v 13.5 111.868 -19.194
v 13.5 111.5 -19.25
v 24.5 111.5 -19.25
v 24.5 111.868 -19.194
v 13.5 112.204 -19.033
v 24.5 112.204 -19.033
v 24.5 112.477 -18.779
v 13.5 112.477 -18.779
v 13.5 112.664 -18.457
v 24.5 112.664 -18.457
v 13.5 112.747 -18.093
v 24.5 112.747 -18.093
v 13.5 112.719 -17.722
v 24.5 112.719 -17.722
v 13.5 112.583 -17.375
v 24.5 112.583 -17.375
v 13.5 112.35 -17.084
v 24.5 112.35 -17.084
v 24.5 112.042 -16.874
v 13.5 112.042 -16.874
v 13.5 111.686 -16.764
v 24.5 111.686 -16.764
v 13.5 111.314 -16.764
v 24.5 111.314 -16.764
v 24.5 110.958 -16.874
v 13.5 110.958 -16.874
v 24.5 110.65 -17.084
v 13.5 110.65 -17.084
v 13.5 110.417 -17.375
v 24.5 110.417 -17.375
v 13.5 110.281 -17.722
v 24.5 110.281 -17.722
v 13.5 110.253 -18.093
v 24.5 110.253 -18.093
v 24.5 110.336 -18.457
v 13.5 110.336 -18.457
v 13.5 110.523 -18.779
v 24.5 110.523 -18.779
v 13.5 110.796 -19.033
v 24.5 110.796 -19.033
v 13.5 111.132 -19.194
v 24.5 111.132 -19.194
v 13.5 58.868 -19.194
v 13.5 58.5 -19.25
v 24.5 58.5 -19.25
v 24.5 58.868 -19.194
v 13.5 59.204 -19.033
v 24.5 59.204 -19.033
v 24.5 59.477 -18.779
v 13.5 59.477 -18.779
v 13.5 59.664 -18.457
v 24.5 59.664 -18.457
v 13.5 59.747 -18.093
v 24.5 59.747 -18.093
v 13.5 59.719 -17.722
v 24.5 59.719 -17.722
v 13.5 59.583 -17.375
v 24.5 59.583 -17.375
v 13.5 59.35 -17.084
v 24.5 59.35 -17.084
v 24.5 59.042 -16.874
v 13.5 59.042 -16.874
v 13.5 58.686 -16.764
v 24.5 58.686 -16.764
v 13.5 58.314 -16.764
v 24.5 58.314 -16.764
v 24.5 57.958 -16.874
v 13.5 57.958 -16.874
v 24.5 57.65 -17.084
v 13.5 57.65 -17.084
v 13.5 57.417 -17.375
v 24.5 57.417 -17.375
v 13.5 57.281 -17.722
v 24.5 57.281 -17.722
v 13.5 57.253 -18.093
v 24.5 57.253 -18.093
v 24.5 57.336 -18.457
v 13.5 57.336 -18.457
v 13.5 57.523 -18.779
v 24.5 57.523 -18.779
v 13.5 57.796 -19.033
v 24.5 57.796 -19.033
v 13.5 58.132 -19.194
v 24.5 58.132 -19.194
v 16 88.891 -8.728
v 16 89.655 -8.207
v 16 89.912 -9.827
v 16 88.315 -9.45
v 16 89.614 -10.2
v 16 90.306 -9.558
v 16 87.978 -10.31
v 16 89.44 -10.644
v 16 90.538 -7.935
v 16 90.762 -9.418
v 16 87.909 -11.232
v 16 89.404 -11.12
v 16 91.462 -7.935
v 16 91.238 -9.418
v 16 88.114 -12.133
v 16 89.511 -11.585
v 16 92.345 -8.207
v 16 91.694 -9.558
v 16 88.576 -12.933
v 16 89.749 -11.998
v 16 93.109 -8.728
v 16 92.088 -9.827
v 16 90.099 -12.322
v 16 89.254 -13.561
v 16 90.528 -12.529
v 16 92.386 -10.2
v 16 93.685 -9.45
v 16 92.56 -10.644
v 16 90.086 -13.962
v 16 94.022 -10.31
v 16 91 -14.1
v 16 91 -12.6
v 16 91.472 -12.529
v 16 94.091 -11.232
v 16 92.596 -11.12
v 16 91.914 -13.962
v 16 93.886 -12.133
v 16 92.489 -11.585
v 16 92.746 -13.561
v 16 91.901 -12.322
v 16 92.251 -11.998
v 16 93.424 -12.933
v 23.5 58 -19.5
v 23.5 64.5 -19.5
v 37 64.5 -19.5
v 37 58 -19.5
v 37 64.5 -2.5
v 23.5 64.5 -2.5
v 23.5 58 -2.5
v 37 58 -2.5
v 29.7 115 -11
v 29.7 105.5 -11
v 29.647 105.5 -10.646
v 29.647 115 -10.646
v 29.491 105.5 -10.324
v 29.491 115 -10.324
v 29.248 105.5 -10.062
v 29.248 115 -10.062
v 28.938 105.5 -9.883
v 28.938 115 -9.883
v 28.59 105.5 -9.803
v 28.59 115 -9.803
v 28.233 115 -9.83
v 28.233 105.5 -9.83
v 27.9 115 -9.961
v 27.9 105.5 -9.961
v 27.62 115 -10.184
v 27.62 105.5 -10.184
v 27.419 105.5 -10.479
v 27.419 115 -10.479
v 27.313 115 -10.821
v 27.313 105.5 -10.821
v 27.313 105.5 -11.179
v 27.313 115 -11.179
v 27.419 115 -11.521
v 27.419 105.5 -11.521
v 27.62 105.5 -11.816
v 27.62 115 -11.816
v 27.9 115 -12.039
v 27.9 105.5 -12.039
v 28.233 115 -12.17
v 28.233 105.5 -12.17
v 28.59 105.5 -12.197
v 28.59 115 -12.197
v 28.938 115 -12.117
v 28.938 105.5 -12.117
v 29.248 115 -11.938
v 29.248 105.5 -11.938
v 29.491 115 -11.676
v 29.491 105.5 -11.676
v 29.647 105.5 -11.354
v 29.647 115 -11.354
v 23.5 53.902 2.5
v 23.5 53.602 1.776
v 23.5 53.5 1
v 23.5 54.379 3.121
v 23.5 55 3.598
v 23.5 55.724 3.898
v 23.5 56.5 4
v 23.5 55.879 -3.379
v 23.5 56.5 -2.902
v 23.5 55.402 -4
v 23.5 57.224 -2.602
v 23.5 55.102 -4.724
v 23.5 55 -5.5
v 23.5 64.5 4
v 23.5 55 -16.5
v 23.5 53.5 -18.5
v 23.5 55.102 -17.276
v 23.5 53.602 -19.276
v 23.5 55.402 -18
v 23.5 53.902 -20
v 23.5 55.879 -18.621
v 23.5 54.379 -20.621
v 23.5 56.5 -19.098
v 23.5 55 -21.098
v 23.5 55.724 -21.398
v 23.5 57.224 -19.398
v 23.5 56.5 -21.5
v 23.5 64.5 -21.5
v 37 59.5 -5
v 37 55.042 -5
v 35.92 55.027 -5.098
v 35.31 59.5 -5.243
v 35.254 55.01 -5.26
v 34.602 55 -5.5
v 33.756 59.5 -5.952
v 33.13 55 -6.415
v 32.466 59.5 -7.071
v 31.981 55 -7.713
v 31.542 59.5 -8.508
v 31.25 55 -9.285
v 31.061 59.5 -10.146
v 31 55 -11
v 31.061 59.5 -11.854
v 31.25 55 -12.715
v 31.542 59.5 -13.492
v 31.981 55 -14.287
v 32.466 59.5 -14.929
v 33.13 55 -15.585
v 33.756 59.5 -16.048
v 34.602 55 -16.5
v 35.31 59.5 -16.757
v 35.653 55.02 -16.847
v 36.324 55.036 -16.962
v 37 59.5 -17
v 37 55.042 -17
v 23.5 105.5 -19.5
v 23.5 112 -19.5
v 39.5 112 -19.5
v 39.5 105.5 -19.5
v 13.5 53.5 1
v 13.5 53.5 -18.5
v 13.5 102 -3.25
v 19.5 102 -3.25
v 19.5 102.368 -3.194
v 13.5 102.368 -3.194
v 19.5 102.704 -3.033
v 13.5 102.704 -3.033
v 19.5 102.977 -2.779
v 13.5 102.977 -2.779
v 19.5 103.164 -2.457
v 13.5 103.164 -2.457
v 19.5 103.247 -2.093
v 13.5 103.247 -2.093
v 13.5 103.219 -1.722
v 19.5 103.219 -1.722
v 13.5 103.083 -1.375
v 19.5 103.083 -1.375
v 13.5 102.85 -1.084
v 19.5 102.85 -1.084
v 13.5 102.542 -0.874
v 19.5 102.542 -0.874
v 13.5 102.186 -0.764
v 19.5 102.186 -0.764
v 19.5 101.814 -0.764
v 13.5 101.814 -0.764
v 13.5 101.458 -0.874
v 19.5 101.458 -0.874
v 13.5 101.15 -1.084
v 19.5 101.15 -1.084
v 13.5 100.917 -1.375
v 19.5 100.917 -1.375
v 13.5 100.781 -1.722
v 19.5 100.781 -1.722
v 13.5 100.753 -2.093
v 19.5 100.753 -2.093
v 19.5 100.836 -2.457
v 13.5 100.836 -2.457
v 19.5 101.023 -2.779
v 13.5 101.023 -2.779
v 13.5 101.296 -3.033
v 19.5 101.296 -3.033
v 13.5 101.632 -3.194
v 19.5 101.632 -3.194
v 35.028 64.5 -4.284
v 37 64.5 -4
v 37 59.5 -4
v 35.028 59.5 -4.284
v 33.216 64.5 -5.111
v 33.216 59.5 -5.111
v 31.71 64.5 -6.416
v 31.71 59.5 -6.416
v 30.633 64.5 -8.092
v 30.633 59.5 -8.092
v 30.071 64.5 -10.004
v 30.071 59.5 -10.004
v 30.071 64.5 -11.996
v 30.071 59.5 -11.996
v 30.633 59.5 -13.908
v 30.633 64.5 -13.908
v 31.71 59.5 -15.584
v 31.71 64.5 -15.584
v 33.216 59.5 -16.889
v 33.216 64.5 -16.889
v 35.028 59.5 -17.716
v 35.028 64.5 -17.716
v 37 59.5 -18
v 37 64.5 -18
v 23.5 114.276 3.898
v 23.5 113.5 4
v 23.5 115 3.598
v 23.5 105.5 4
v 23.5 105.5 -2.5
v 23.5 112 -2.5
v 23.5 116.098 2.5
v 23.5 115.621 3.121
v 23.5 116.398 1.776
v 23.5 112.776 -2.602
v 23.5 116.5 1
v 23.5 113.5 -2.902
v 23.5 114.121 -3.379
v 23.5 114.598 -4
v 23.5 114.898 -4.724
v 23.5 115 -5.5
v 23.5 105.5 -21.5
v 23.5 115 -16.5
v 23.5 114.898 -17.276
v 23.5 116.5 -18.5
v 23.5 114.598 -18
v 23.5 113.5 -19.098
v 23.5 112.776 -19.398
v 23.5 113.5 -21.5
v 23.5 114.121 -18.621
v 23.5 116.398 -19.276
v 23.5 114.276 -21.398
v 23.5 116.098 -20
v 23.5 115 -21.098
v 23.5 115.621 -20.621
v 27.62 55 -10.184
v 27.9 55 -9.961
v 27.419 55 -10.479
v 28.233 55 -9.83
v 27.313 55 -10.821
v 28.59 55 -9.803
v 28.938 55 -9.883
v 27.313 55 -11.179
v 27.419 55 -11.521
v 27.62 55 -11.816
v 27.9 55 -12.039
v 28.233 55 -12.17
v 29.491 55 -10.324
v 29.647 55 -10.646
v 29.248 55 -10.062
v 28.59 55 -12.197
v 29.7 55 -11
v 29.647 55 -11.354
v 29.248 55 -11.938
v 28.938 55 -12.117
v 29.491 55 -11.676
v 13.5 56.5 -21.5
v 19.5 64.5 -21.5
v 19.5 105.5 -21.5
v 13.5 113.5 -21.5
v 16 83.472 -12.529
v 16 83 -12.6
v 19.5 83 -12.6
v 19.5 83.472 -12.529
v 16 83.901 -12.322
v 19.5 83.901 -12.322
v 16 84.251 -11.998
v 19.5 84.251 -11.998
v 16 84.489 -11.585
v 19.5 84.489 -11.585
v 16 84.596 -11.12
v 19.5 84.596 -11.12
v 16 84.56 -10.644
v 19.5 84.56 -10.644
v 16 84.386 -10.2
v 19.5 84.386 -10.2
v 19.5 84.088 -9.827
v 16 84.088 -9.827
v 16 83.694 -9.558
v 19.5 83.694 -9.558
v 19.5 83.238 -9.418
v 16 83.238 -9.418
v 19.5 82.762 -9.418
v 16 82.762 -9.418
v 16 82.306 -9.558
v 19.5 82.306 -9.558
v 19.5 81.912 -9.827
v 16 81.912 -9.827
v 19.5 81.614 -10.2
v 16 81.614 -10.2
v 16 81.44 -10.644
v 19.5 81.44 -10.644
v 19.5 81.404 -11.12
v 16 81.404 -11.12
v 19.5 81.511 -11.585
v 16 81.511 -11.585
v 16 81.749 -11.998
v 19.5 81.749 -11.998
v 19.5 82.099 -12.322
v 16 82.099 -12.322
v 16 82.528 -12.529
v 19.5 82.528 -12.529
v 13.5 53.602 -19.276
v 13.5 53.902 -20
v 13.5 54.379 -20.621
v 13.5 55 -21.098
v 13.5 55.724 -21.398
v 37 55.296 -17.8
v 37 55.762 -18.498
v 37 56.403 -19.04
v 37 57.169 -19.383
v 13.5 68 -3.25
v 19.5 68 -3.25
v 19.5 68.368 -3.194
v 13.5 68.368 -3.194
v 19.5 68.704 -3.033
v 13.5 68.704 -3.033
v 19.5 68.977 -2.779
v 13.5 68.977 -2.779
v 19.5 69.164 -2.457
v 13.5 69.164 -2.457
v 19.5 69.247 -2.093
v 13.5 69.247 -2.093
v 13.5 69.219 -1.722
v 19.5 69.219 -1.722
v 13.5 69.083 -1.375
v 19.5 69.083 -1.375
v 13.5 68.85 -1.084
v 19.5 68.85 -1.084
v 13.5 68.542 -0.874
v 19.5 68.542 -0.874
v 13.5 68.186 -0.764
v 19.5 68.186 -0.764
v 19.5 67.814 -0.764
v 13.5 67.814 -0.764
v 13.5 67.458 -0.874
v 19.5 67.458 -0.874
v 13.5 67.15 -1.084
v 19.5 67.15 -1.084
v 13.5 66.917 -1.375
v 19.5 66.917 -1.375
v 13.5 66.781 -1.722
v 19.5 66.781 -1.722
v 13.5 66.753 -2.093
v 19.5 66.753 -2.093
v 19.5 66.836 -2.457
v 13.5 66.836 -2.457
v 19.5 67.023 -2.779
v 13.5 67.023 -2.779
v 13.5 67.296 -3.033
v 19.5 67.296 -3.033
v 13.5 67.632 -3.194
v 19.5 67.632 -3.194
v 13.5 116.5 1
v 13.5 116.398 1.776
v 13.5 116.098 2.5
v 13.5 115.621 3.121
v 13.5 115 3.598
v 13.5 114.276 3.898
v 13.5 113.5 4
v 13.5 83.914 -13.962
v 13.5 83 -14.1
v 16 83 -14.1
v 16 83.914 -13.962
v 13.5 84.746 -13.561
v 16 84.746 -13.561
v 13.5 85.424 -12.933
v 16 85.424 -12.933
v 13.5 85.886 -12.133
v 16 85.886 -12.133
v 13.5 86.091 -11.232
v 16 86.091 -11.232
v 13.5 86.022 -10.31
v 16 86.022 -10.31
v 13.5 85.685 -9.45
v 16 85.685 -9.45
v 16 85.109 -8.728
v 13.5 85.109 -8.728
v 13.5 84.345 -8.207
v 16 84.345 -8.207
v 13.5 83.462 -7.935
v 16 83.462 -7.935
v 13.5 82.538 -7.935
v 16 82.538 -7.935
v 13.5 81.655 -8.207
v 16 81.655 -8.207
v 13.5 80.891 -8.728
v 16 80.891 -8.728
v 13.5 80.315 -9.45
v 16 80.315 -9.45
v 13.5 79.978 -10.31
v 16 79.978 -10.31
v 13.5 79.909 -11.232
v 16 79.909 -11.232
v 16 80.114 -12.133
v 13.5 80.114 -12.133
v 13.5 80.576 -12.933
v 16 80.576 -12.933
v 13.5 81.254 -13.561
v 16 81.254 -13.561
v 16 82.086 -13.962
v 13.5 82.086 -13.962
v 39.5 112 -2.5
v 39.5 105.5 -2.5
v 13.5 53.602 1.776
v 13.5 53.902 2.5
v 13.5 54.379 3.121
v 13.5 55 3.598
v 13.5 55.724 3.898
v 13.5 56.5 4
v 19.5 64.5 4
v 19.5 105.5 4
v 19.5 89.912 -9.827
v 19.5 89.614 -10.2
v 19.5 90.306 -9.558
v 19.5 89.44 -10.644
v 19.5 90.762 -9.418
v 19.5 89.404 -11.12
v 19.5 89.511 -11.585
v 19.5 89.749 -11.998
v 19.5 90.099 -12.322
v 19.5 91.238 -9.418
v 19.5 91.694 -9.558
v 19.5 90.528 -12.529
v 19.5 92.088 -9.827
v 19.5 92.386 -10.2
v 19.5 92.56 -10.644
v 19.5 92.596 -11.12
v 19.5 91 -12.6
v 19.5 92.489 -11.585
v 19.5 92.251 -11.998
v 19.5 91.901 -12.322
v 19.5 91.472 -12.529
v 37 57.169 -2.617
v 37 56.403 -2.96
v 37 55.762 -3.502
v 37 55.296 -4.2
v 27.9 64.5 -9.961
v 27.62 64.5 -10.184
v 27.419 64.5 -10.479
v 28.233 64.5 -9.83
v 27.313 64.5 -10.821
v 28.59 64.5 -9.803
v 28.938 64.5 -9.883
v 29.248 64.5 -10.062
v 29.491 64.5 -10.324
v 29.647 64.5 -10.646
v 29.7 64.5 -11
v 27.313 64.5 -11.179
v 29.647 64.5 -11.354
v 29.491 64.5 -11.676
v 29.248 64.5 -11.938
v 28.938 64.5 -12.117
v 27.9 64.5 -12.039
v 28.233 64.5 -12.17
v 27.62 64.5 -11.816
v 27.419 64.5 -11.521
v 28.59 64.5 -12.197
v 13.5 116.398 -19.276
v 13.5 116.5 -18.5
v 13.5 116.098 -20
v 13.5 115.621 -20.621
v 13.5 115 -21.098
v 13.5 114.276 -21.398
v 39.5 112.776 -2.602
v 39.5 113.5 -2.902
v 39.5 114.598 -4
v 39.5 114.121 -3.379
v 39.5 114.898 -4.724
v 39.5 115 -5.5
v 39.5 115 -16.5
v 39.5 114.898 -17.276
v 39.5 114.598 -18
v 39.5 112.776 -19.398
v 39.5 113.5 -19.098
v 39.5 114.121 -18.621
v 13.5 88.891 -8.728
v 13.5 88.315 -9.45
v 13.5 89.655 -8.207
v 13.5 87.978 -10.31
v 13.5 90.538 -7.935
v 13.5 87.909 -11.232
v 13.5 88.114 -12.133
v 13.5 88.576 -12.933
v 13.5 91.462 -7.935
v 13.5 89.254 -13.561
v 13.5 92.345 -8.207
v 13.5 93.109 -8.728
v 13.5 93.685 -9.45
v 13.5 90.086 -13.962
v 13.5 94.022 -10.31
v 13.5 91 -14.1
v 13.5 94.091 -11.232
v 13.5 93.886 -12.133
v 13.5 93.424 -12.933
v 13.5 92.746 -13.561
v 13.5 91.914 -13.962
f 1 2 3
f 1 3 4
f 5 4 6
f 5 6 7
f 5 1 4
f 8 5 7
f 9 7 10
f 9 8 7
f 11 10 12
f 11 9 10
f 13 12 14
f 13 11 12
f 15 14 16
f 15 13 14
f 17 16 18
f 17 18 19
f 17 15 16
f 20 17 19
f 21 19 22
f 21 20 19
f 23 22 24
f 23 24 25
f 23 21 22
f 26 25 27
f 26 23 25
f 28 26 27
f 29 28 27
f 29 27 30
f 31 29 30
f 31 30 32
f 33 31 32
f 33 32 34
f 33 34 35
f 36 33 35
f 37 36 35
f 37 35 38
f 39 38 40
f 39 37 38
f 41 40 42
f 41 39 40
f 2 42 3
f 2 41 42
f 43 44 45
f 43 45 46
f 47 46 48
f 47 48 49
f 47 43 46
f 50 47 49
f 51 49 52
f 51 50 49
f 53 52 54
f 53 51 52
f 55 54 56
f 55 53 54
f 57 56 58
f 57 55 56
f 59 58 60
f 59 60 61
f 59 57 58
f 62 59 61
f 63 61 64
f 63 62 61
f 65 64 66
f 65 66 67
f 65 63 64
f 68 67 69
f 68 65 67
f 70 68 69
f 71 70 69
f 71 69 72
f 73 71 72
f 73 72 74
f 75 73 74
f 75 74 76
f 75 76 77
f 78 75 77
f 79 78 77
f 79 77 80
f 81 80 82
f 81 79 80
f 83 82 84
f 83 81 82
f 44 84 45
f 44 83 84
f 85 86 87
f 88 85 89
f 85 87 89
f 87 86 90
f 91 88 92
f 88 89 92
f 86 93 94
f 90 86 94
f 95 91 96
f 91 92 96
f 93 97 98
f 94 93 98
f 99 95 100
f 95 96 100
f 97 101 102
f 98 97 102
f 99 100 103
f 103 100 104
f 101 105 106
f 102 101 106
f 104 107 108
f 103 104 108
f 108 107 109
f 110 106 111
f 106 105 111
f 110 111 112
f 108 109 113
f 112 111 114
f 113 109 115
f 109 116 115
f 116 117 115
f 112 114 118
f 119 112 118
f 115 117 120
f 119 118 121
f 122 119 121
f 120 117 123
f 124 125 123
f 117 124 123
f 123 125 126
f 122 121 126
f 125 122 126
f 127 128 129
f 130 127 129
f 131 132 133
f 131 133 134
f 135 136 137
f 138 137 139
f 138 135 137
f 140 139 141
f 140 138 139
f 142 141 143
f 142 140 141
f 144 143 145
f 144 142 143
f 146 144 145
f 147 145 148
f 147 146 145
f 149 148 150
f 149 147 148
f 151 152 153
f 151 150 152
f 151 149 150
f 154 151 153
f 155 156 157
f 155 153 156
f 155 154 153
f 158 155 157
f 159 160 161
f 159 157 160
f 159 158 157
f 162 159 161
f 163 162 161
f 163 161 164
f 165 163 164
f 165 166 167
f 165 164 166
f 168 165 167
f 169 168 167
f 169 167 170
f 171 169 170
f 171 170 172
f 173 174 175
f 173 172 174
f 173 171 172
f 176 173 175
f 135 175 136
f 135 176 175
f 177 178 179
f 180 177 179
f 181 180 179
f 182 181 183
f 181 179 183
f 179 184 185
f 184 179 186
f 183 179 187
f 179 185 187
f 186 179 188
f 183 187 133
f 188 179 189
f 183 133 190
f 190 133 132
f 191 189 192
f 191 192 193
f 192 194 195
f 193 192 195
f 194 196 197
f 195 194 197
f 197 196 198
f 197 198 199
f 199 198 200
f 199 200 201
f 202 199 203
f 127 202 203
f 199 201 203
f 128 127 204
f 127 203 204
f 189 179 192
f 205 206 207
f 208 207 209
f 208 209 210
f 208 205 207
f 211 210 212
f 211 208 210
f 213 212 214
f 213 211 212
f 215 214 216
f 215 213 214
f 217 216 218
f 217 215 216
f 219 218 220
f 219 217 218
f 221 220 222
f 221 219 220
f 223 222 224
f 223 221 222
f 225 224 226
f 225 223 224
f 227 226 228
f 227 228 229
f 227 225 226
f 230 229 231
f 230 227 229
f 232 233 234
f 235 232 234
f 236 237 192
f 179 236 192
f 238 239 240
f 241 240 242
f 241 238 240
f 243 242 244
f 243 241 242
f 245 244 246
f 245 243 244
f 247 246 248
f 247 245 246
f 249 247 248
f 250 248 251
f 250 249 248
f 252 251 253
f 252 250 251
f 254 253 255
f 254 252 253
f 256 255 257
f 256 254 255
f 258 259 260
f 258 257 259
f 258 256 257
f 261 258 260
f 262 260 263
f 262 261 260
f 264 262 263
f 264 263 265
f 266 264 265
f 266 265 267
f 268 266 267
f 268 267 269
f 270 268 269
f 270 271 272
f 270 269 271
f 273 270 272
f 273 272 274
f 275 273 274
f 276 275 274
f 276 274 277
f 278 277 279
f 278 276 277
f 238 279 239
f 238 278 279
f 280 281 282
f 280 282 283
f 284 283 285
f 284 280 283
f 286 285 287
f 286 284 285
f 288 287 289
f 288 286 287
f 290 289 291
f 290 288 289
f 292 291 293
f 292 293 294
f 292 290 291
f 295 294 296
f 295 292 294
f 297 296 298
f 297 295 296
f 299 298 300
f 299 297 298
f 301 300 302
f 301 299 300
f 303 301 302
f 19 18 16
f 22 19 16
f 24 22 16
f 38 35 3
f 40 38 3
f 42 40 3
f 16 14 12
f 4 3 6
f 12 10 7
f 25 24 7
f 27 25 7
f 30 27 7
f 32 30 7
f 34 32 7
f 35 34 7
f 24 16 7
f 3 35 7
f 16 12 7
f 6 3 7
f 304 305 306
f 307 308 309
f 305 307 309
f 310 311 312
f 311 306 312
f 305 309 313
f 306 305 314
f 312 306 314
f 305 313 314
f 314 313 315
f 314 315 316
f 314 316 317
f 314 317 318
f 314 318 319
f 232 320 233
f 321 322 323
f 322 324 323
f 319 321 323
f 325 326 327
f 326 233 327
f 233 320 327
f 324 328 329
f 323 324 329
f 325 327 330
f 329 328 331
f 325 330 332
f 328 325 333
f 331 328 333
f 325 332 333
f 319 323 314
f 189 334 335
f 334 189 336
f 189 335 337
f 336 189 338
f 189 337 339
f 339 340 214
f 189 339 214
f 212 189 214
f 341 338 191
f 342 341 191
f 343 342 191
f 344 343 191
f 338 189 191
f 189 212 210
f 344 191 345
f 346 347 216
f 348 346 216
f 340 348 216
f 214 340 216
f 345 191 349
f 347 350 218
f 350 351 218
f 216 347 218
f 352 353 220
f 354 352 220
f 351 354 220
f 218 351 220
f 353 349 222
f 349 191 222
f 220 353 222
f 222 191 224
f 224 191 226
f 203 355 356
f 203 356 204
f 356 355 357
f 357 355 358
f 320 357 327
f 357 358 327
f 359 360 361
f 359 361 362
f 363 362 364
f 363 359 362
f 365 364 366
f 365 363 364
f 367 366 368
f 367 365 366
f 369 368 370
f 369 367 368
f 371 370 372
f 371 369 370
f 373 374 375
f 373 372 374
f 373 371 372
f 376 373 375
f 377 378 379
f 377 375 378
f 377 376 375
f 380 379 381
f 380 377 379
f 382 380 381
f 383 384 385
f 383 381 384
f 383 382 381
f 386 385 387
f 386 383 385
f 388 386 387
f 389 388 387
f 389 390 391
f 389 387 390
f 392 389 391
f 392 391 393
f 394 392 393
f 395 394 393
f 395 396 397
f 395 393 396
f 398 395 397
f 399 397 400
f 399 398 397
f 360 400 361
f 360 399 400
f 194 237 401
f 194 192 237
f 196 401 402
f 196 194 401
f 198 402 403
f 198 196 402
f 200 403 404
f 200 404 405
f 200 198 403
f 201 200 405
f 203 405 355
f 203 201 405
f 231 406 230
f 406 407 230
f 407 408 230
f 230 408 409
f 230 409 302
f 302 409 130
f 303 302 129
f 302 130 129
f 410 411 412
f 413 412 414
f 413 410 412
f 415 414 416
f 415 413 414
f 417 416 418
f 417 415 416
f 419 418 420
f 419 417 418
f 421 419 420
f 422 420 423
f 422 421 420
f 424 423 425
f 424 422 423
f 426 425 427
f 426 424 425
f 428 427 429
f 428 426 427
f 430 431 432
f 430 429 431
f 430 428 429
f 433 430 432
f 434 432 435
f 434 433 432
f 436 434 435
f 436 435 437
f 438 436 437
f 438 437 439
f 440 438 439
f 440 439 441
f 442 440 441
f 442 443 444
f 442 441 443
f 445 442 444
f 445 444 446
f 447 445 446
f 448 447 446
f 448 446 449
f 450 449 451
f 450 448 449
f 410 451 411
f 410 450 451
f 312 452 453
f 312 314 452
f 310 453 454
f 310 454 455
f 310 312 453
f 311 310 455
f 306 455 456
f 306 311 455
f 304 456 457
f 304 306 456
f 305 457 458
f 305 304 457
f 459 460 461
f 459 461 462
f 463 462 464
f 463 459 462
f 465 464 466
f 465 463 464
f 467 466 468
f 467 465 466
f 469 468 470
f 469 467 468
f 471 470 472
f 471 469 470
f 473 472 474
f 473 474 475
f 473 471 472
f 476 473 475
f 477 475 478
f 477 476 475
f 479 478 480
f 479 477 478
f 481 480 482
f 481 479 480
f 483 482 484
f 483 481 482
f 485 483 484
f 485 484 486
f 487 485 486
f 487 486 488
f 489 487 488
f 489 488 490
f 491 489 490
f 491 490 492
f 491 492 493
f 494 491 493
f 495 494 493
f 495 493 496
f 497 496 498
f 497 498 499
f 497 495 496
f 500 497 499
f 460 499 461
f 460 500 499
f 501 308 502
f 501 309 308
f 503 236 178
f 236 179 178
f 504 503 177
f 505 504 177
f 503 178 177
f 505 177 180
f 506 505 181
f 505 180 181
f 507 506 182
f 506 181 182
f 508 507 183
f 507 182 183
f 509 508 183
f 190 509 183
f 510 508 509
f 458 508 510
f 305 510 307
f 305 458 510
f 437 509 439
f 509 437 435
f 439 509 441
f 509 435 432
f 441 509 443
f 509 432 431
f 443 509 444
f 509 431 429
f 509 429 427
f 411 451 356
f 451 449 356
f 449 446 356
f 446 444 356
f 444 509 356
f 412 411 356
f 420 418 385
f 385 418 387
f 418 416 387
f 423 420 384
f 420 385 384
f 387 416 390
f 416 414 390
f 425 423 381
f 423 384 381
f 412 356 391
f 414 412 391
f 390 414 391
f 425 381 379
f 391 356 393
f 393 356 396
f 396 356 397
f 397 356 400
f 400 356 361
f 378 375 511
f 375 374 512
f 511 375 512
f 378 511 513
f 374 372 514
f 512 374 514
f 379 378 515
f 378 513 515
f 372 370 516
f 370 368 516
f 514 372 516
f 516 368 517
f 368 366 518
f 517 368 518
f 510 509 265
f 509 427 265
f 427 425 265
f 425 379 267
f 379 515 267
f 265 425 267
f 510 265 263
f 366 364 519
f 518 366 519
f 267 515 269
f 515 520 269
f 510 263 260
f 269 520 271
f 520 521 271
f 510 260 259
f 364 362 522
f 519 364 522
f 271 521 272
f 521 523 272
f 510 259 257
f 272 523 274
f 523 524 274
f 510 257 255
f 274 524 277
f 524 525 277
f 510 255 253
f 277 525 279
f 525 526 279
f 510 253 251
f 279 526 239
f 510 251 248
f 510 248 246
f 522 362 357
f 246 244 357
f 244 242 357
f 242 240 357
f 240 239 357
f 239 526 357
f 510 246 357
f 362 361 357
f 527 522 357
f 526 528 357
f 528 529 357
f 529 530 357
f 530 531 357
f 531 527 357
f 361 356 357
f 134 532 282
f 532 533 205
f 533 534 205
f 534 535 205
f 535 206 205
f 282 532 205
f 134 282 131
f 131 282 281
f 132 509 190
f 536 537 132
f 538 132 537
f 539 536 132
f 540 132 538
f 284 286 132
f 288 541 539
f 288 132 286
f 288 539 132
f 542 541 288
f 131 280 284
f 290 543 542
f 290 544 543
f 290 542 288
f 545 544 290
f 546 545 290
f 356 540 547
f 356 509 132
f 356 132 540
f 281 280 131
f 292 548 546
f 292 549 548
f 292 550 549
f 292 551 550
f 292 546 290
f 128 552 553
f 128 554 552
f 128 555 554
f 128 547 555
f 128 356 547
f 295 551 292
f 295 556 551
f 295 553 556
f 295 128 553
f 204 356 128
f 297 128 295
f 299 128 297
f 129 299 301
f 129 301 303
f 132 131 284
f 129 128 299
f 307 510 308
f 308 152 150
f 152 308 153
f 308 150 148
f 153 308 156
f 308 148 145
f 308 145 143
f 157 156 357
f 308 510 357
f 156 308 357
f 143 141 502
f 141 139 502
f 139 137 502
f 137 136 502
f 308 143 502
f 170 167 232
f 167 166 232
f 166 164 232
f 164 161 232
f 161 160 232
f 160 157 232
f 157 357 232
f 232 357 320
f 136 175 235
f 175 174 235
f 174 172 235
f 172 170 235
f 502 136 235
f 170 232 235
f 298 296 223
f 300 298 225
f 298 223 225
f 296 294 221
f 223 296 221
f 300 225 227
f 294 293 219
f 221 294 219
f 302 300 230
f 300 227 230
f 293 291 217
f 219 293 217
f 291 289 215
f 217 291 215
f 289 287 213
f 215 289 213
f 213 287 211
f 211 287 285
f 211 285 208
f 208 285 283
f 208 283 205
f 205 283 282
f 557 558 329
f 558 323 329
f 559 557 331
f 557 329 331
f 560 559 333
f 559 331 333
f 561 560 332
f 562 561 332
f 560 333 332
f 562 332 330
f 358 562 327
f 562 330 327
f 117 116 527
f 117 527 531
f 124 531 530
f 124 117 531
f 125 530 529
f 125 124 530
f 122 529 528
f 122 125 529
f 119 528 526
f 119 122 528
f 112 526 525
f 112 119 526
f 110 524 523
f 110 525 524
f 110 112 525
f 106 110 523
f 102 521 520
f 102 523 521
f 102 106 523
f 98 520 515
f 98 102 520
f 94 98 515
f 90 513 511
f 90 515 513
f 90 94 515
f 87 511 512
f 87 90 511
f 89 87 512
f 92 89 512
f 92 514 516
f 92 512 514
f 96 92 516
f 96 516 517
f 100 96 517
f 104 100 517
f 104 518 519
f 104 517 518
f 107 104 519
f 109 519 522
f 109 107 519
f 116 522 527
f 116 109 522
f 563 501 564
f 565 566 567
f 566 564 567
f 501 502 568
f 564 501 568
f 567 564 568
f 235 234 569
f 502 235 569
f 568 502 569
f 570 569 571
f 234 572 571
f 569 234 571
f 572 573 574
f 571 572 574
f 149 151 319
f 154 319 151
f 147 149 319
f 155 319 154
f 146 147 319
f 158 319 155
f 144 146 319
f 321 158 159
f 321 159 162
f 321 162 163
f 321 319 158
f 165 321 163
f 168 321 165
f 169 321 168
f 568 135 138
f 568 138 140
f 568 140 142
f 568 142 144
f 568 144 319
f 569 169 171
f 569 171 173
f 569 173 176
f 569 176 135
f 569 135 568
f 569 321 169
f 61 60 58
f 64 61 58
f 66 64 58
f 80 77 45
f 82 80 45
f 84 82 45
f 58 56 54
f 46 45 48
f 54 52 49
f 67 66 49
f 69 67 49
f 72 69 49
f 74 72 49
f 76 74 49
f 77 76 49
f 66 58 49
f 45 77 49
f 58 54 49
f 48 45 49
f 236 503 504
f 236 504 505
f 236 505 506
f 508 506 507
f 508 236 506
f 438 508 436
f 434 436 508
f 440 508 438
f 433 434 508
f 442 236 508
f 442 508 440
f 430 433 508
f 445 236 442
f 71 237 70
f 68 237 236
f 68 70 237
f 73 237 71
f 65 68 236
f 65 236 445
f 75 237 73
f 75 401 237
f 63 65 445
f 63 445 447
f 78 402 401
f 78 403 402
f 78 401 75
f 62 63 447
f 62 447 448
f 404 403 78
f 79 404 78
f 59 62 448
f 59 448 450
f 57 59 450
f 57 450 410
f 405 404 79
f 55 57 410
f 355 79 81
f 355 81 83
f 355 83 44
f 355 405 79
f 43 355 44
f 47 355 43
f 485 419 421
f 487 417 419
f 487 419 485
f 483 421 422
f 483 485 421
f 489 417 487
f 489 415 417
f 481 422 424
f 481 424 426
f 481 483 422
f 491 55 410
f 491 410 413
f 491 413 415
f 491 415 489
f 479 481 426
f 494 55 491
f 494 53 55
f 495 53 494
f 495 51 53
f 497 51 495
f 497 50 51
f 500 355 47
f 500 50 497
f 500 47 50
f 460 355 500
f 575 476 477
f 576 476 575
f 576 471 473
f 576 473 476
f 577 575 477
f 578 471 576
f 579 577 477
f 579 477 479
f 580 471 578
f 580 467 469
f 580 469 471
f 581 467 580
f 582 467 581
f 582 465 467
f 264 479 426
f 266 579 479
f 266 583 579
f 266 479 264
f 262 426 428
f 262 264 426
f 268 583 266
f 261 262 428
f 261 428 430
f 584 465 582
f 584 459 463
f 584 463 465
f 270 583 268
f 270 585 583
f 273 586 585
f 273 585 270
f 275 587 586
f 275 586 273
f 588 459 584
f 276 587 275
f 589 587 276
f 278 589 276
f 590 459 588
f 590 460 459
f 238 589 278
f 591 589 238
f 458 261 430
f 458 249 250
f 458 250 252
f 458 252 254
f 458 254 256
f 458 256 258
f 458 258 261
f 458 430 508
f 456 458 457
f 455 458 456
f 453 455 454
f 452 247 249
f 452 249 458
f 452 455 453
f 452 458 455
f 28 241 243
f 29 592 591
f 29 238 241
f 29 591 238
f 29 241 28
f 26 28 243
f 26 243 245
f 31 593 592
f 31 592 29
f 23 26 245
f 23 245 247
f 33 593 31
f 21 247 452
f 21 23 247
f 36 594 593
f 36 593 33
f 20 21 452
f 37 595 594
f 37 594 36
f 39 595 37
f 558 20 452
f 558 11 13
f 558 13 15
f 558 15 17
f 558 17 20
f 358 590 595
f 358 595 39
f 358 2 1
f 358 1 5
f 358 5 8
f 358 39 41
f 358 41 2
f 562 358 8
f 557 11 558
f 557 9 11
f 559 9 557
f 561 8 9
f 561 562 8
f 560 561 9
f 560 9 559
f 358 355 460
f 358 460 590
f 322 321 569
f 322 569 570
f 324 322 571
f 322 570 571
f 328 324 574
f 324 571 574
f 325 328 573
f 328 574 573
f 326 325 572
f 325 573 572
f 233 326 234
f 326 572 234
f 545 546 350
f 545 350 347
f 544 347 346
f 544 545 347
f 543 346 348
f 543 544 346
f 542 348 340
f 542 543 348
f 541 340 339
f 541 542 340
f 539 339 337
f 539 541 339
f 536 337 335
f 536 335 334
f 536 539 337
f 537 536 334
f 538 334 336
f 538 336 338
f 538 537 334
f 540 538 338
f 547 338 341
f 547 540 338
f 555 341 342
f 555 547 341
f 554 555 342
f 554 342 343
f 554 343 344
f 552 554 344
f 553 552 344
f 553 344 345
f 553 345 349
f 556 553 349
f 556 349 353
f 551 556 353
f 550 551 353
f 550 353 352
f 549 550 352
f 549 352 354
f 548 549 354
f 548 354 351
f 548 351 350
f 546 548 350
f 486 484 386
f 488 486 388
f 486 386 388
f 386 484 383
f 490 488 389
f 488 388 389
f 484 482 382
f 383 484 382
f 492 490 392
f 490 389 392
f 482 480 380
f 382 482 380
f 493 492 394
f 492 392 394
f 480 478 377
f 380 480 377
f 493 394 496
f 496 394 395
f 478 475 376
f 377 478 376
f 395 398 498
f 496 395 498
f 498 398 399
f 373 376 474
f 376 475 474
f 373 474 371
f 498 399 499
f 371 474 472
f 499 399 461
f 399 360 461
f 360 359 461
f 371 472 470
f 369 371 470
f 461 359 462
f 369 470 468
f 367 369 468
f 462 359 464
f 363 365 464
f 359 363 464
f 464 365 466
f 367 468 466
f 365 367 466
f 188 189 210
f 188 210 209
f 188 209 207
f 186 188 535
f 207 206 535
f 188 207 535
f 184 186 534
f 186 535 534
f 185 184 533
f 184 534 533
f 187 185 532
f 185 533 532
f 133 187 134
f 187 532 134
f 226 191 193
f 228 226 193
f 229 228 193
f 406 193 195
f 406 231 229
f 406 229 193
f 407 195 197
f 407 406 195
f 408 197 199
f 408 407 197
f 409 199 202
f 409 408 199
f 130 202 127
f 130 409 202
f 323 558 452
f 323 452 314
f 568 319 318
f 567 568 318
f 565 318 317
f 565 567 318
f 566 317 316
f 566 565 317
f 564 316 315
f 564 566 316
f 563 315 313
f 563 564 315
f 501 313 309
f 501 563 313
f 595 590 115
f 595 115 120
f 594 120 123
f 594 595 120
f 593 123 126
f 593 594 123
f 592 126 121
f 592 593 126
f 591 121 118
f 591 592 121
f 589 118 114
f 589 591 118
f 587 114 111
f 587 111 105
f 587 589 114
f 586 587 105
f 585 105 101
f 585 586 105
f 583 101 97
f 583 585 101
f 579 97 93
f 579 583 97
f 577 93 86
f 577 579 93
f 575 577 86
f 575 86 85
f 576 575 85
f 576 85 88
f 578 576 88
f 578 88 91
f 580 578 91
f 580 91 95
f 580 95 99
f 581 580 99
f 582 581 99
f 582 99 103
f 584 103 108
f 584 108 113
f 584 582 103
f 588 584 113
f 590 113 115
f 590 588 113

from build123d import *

# Parameters (mm, degrees)
CYLINDER959_R           = 1.6
CYLINDER959_DEPTH       = 10
CYLINDER959_PITCH_ANGLE = 90
CYLINDER960_R           = 1.6
CYLINDER960_DEPTH       = 10
CYLINDER960_PITCH_ANGLE = 90
CYLINDER962_R           = 3.1
CYLINDER962_DEPTH       = 2.5
CYLINDER962_PITCH_ANGLE = 90
CYLINDER961_R           = 3.1
CYLINDER961_DEPTH       = 2.5
CYLINDER961_PITCH_ANGLE = 90
BOX562_W                = 41
BOX562_H                = 41
BOX562_DEPTH            = 26
CYLINDER958_R           = 6
CYLINDER958_DEPTH       = 11
CYLINDER958_ROLL_ANGLE  = 90
CYLINDER963_R           = 7
CYLINDER963_DEPTH       = 5
CYLINDER963_ROLL_ANGLE  = 90
BOX563_W                = 10
BOX563_H                = 10
BOX563_DEPTH            = 17
CYLINDER953_R           = 1.2
CYLINDER953_DEPTH       = 10
CYLINDER953_ROLL_ANGLE  = 90
CYLINDER952_R           = 1.2
CYLINDER952_DEPTH       = 10
CYLINDER952_ROLL_ANGLE  = 90
CYLINDER957_R           = 1.25
CYLINDER957_DEPTH       = 15
CYLINDER957_PITCH_ANGLE = 90
CYLINDER955_R           = 1.25
CYLINDER955_DEPTH       = 11
CYLINDER955_PITCH_ANGLE = 90
CYLINDER956_R           = 1.25
CYLINDER956_DEPTH       = 15
CYLINDER956_PITCH_ANGLE = 90
CYLINDER954_R           = 1.25
CYLINDER954_DEPTH       = 11
CYLINDER954_PITCH_ANGLE = 90
BOX561_W                = 10
BOX561_H                = 63
BOX561_DEPTH            = 25.5
FILLET358_R             = 3
BOX560_W                = 16
BOX560_H                = 60
BOX560_DEPTH            = 17
FILLET359_R             = 3


with BuildPart() as cylinder1122:
    # Cylinder959 → Cylinder959 (new body)
    with BuildSketch(Plane.XY):
        Circle(CYLINDER959_R)
    extrude(amount=CYLINDER959_DEPTH)


with BuildPart() as cylinder1122_1:
    # Cylinder959 pitch: moved
    add(cylinder1122.part.rotate(Axis((0, 0, 0), (0, 1, 0)), CYLINDER959_PITCH_ANGLE))


with BuildPart() as cylinder1122_2:
    # Cylinder959 placement: moved
    add(cylinder1122_1.part.moved(Location((13.5, 83, -11))))


with BuildPart() as cylinder1123:
    # Cylinder960 → Cylinder960 (new body)
    with BuildSketch(Plane.XY):
        Circle(CYLINDER960_R)
    extrude(amount=CYLINDER960_DEPTH)


with BuildPart() as cylinder1123_1:
    # Cylinder960 pitch: moved
    add(cylinder1123.part.rotate(Axis((0, 0, 0), (0, 1, 0)), CYLINDER960_PITCH_ANGLE))


with BuildPart() as cylinder1123_2:
    # Cylinder960 placement: moved
    add(cylinder1123_1.part.moved(Location((13.5, 91, -11))))


with BuildPart() as cylinder1125:
    # Cylinder962 → Cylinder962 (new body)
    with BuildSketch(Plane.XY):
        Circle(CYLINDER962_R)
    extrude(amount=CYLINDER962_DEPTH)


with BuildPart() as cylinder1125_1:
    # Cylinder962 pitch: moved
    add(cylinder1125.part.rotate(Axis((0, 0, 0), (0, 1, 0)), CYLINDER962_PITCH_ANGLE))


with BuildPart() as cylinder1125_2:
    # Cylinder962 placement: moved
    add(cylinder1125_1.part.moved(Location((13.5, 83, -11))))


with BuildPart() as fusion603:
    # Cylinder961 → Cylinder961 (new body)
    with BuildSketch(Plane.XY):
        Circle(CYLINDER961_R)
    extrude(amount=CYLINDER961_DEPTH)


with BuildPart() as fusion603_1:
    # Cylinder961 pitch: moved
    add(fusion603.part.rotate(Axis((0, 0, 0), (0, 1, 0)), CYLINDER961_PITCH_ANGLE))


with BuildPart() as fusion603_2:
    # Cylinder961 placement: moved
    add(fusion603_1.part.moved(Location((13.5, 91, -11))))

    # Fusion603: union Cylinder1122, Cylinder1123, Cylinder1125
    add(cylinder1122_2.part)
    add(cylinder1123_2.part)
    add(cylinder1125_2.part)


with BuildPart() as cube753:
    # Box562 → Box562 (new body)
    with BuildSketch(Plane(origin=(19.5, 64.5, -21.5), x_dir=(1, 0, 0), z_dir=(0, 0, 1))):
        with Locations((20.5, 20.5)):
            Rectangle(BOX562_W, BOX562_H)
    extrude(amount=BOX562_DEPTH)


with BuildPart() as cylinder1121:
    # Cylinder958 → Cylinder958 (new body)
    with BuildSketch(Plane.XY):
        Circle(CYLINDER958_R)
    extrude(amount=CYLINDER958_DEPTH)


with BuildPart() as cylinder1121_1:
    # Cylinder958 roll: moved
    add(cylinder1121.part.rotate(Axis((0, 0, 0), (1, 0, 0)), CYLINDER958_ROLL_ANGLE))


with BuildPart() as cylinder1121_2:
    # Cylinder958 placement: moved
    add(cylinder1121_1.part.moved(Location((37, 64.5, -11))))


with BuildPart() as cylinder1126:
    # Cylinder963 → Cylinder963 (new body)
    with BuildSketch(Plane.XY):
        Circle(CYLINDER963_R)
    extrude(amount=CYLINDER963_DEPTH)


with BuildPart() as cylinder1126_1:
    # Cylinder963 roll: moved
    add(cylinder1126.part.rotate(Axis((0, 0, 0), (1, 0, 0)), CYLINDER963_ROLL_ANGLE))


with BuildPart() as cylinder1126_2:
    # Cylinder963 placement: moved
    add(cylinder1126_1.part.moved(Location((37, 64.5, -11))))


with BuildPart() as fusion604:
    # Box563 → Box563 (new body)
    with BuildSketch(Plane(origin=(37, 55, -19.5), x_dir=(1, 0, 0), z_dir=(0, 0, 1))):
        with Locations((5, 5)):
            Rectangle(BOX563_W, BOX563_H)
    extrude(amount=BOX563_DEPTH)

    # Fusion604: union Cube753, Cylinder1121, Cylinder1126
    add(cube753.part)
    add(cylinder1121_2.part)
    add(cylinder1126_2.part)


with BuildPart() as cylinder1116:
    # Cylinder953 → Cylinder953 (new body)
    with BuildSketch(Plane.XY):
        Circle(CYLINDER953_R)
    extrude(amount=CYLINDER953_DEPTH)


with BuildPart() as cylinder1116_1:
    # Cylinder953 roll: moved
    add(cylinder1116.part.rotate(Axis((0, 0, 0), (1, 0, 0)), CYLINDER953_ROLL_ANGLE))


with BuildPart() as cylinder1116_2:
    # Cylinder953 placement: moved
    add(cylinder1116_1.part.moved(Location((3, 10, 10))))


with BuildPart() as fusion600:
    # Cylinder952 → Cylinder952 (new body)
    with BuildSketch(Plane.XY):
        Circle(CYLINDER952_R)
    extrude(amount=CYLINDER952_DEPTH)


with BuildPart() as fusion600_1:
    # Cylinder952 roll: moved
    add(fusion600.part.rotate(Axis((0, 0, 0), (1, 0, 0)), CYLINDER952_ROLL_ANGLE))


with BuildPart() as fusion600_2:
    # Cylinder952 placement: moved
    add(fusion600_1.part.moved(Location((3, 60, 10))))

    # Fusion600: union Cylinder1116
    add(cylinder1116_2.part)


with BuildPart() as fusion600_3:
    # Fusion600 placement: moved
    add(fusion600_2.part.moved(Location((0, 0, 2))))


with BuildPart() as cylinder1120:
    # Cylinder957 → Cylinder957 (new body)
    with BuildSketch(Plane.XY):
        Circle(CYLINDER957_R)
    extrude(amount=CYLINDER957_DEPTH)


with BuildPart() as cylinder1120_1:
    # Cylinder957 pitch: moved
    add(cylinder1120.part.rotate(Axis((0, 0, 0), (0, 1, 0)), CYLINDER957_PITCH_ANGLE))


with BuildPart() as cylinder1120_2:
    # Cylinder957 placement: moved
    add(cylinder1120_1.part.moved(Location((-2, 23, 20))))


with BuildPart() as cylinder1118:
    # Cylinder955 → Cylinder955 (new body)
    with BuildSketch(Plane.XY):
        Circle(CYLINDER955_R)
    extrude(amount=CYLINDER955_DEPTH)


with BuildPart() as cylinder1118_1:
    # Cylinder955 pitch: moved
    add(cylinder1118.part.rotate(Axis((0, 0, 0), (0, 1, 0)), CYLINDER955_PITCH_ANGLE))


with BuildPart() as cylinder1118_2:
    # Cylinder955 placement: moved
    add(cylinder1118_1.part.moved(Location((-2, 13.5, 4))))


with BuildPart() as cylinder1119:
    # Cylinder956 → Cylinder956 (new body)
    with BuildSketch(Plane.XY):
        Circle(CYLINDER956_R)
    extrude(amount=CYLINDER956_DEPTH)


with BuildPart() as cylinder1119_1:
    # Cylinder956 pitch: moved
    add(cylinder1119.part.rotate(Axis((0, 0, 0), (0, 1, 0)), CYLINDER956_PITCH_ANGLE))


with BuildPart() as cylinder1119_2:
    # Cylinder956 placement: moved
    add(cylinder1119_1.part.moved(Location((-2, 57, 20))))


with BuildPart() as fusion601:
    # Cylinder954 → Cylinder954 (new body)
    with BuildSketch(Plane.XY):
        Circle(CYLINDER954_R)
    extrude(amount=CYLINDER954_DEPTH)


with BuildPart() as fusion601_1:
    # Cylinder954 pitch: moved
    add(fusion601.part.rotate(Axis((0, 0, 0), (0, 1, 0)), CYLINDER954_PITCH_ANGLE))


with BuildPart() as fusion601_2:
    # Cylinder954 placement: moved
    add(fusion601_1.part.moved(Location((-2, 66.5, 4))))

    # Fusion599: union Cylinder1120, Cylinder1118, Cylinder1119
    add(cylinder1120_2.part)
    add(cylinder1118_2.part)
    add(cylinder1119_2.part)


with BuildPart() as fusion601_3:
    # Fusion599 placement: moved
    add(fusion601_2.part.moved(Location((-10, -10, 1))))

    # Fusion601: union Fusion600
    add(fusion600_3.part)


with BuildPart() as fusion601_4:
    # Fusion601 placement: moved
    add(fusion601_3.part.moved(Location((25.5, 55, -23))))


with BuildPart() as fillet358:
    # Box561 → Box561 (new body)
    with BuildSketch(Plane(origin=(-12, 0, -5), x_dir=(1, 0, 0), z_dir=(0, 0, 1))):
        with Locations((5, 31.5)):
            Rectangle(BOX561_W, BOX561_H)
    extrude(amount=BOX561_DEPTH)

    # Fillet358
    fillet358_edges = [fillet358.edges().sort_by_distance(p)[0] for p in [
        (-7, 0, -5),
        (-7, 0, 20.5),
        (-7, 63, -5),
        (-7, 63, 20.5),
    ]]
    fillet(fillet358_edges, radius=FILLET358_R)


with BuildPart() as fillet358_1:
    # Fillet358 placement: moved
    add(fillet358.part.moved(Location((25.5, 53.5, -16.5))))


with BuildPart() as cross_member_front_lifted:
    # Box560 → Box560 (new body)
    with BuildSketch(Plane(origin=(-2, 0, 1.5), x_dir=(1, 0, 0), z_dir=(0, 0, 1))):
        with Locations((8, 30)):
            Rectangle(BOX560_W, BOX560_H)
    extrude(amount=BOX560_DEPTH)

    # Fillet359
    fillet359_edges = [cross_member_front_lifted.edges().sort_by_distance(p)[0] for p in [
        (6, 0, 1.5),
        (6, 0, 18.5),
        (6, 60, 1.5),
        (6, 60, 18.5),
    ]]
    fillet(fillet359_edges, radius=FILLET359_R)


with BuildPart() as cross_member_front_lifted_1:
    # Fillet359 placement: moved
    add(cross_member_front_lifted.part.moved(Location((25.5, 55, -21))))

    # Fusion605: union Fillet358
    add(fillet358_1.part)

    # Cut698: cut Fusion601
    add(fusion601_4.part, mode=Mode.SUBTRACT)

    # Cut699: cut Fusion604
    add(fusion604.part, mode=Mode.SUBTRACT)

    # Cut700: cut Fusion603
    add(fusion603_2.part, mode=Mode.SUBTRACT)


solid = cross_member_front_lifted_1.part
